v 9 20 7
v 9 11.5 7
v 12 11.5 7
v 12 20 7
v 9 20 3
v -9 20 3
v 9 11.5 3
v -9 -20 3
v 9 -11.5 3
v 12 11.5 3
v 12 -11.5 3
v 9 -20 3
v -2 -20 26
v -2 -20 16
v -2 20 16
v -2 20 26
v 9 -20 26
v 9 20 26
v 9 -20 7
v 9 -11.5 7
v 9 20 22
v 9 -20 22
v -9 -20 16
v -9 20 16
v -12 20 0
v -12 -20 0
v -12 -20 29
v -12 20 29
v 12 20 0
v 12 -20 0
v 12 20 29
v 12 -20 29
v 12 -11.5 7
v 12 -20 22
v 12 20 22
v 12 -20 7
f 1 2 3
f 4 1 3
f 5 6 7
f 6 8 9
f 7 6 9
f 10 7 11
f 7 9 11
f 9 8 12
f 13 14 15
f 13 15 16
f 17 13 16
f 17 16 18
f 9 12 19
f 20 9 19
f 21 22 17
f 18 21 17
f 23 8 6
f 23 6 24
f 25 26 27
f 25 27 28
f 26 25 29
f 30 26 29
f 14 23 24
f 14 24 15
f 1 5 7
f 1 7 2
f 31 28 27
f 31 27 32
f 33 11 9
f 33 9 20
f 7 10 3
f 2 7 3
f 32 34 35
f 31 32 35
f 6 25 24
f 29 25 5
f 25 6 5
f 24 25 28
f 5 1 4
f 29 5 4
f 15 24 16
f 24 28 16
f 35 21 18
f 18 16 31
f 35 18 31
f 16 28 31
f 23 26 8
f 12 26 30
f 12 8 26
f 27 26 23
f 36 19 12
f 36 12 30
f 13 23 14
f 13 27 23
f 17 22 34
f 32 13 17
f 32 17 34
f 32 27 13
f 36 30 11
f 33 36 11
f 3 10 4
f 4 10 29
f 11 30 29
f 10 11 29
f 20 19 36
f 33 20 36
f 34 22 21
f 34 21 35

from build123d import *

# Parameters (mm, degrees)
F0_W     = 24
F0_H     = 40
F1_DEPTH = 29
F2_W     = 18
F2_H     = 23
F3_DEPTH = 61.722
F4_W     = 3
F4_H     = 15
F5_DEPTH = 55.626
F6_W     = 23
F6_H     = 4
F7_DEPTH = 5.334
F8_W     = 7
F8_H     = 10
F9_DEPTH = 40


with BuildPart() as f1:
    # F0 (on Top) → F1 (new body)
    with BuildSketch(Plane.XY):
        Rectangle(F0_W, F0_H)
    extrude(amount=F1_DEPTH)

    # F2 (on face) → F3 (cut)
    with BuildSketch(Plane.XZ.offset(20)):
        with Locations((0, 14.5)):
            Rectangle(F2_W, F2_H)
    extrude(amount=-F3_DEPTH, mode=Mode.SUBTRACT)

    # F4 (on face) → F5 (cut)
    with BuildSketch(Plane.XZ.offset(20)):
        with Locations((10.5, 14.5)):
            Rectangle(F4_W, F4_H)
    extrude(amount=-F5_DEPTH, mode=Mode.SUBTRACT)

    # F6 (on face) → F7 (cut)
    with BuildSketch(Plane.YZ.offset(12)):
        with Locations((0, 5)):
            Rectangle(F6_W, F6_H)
    extrude(amount=-F7_DEPTH, mode=Mode.SUBTRACT)

    # F8 (on face) → F9 (join)
    with BuildSketch(Plane.XZ.offset(20)):
        with Locations((-5.5, 21)):
            Rectangle(F8_W, F8_H)
    extrude(amount=-F9_DEPTH)


solid = f1.part
